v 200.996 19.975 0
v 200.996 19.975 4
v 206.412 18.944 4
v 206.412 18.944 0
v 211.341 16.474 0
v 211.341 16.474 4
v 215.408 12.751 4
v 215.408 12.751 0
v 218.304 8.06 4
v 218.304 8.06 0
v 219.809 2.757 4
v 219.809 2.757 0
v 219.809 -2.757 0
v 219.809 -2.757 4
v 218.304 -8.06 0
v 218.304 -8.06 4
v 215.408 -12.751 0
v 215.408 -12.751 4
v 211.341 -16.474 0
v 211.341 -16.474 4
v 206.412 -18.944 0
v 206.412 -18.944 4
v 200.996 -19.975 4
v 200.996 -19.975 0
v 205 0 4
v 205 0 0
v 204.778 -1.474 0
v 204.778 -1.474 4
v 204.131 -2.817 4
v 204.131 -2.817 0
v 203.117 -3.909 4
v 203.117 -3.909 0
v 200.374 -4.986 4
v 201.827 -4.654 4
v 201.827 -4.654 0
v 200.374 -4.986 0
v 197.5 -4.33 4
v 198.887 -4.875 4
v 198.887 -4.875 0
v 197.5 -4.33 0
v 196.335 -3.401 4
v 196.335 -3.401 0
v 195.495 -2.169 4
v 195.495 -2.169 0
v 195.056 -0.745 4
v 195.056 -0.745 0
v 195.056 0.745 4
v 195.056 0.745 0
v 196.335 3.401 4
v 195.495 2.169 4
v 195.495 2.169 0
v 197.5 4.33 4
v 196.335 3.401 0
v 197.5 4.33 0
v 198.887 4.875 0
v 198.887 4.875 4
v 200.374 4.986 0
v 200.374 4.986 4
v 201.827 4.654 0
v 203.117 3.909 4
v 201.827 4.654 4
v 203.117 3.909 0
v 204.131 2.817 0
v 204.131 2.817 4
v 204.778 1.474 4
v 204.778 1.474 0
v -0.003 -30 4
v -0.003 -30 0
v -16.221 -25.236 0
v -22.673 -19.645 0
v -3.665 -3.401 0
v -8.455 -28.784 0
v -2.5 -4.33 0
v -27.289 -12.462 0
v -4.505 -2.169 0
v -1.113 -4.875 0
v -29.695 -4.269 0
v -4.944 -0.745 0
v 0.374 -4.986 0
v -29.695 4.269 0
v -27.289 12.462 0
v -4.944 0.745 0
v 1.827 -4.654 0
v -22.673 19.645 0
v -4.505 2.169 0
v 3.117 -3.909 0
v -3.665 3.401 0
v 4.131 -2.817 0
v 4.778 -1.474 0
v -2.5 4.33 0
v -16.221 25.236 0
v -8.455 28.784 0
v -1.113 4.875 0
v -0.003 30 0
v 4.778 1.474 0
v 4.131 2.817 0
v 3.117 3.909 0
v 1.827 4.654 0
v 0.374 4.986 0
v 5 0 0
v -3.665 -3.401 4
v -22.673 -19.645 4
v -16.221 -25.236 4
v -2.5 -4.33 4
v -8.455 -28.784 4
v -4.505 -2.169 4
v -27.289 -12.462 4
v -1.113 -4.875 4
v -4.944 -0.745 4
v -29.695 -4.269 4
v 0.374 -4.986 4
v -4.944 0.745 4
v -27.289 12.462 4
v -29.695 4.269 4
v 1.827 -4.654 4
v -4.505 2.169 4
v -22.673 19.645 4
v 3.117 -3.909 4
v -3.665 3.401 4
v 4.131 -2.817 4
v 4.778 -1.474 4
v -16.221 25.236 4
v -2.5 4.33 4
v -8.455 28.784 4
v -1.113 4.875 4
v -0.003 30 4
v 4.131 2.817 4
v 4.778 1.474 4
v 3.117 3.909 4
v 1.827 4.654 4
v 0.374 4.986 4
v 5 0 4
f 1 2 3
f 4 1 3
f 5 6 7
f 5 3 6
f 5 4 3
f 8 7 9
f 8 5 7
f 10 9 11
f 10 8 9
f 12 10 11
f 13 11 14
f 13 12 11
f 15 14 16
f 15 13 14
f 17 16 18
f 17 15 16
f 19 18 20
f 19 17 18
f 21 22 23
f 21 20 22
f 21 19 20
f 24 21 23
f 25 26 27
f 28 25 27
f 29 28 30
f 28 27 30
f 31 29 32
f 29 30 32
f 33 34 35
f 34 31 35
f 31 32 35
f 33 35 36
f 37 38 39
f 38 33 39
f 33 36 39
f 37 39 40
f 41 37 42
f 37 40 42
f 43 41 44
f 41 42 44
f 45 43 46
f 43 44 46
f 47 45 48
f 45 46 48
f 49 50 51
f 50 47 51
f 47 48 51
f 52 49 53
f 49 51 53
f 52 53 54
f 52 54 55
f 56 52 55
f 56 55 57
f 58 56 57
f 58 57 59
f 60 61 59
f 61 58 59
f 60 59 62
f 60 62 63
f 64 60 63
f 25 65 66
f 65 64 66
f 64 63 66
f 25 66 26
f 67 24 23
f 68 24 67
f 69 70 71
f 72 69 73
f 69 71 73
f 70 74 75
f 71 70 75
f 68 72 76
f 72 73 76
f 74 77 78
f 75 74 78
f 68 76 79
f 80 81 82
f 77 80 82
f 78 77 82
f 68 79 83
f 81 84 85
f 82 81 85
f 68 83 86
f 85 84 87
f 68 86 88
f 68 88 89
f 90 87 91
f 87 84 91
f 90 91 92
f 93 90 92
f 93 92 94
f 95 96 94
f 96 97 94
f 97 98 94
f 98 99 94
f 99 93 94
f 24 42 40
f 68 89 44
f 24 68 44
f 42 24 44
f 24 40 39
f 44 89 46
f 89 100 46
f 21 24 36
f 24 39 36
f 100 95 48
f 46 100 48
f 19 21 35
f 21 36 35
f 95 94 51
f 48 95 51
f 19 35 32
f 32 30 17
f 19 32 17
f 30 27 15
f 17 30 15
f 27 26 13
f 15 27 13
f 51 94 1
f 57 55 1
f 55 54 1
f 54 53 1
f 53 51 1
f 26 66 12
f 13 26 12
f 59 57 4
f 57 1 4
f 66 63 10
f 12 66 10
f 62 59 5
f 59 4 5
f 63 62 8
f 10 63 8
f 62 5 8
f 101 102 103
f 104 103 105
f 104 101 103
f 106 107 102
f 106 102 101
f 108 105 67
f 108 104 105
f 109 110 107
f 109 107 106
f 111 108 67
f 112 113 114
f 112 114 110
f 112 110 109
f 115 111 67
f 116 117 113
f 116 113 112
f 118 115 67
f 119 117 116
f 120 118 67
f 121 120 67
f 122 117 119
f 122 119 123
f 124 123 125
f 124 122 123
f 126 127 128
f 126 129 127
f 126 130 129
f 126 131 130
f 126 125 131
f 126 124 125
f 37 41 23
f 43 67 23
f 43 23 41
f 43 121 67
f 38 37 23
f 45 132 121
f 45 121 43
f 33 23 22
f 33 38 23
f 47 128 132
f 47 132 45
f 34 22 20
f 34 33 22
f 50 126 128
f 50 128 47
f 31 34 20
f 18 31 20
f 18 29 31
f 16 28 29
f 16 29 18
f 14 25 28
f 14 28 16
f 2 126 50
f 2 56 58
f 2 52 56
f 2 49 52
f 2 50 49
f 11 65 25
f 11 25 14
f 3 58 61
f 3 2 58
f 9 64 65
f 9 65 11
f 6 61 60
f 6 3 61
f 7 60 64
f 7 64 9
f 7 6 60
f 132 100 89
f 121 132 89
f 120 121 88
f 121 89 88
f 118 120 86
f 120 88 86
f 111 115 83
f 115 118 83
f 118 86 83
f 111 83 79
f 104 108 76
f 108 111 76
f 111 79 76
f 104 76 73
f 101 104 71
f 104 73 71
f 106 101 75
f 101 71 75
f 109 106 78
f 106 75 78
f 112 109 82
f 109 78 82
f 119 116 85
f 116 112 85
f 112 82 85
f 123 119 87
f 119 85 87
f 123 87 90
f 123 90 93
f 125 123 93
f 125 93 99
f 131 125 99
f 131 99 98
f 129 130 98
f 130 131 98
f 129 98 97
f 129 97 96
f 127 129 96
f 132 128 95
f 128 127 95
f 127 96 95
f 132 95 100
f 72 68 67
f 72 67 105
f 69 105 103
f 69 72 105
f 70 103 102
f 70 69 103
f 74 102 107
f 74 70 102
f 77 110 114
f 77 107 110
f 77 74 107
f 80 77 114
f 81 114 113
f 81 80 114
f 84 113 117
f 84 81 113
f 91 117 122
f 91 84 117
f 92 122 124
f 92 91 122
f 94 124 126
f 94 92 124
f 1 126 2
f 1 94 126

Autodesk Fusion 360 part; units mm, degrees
sketch "Boceto1" plane through (0, 0, 0) normal (0, 0, 1) x (1, 0, 0)
  circle A0 centre (0, 0) radius 30
  circle A1 centre (200, 0) radius 20
  line L0 (-0.0033, 30) -> (200.9963, 19.9752)
  line L1 (200.9963, -19.9752) -> (-0.0033, -30)
  circle A2 centre (0, 0) radius 5
  circle A3 centre (200, 0) radius 5
extrude "Extruir1" add sketch "Boceto1" along normal blind 4 contours A0 L0 L1 | A0 A1 L0 L1 | A1
sketch "Boceto2" plane through (0, 0, 4) normal (0, 0, 1) x (-1, 0, 0)
  circle A0 centre (-200, 0) radius 5
  circle A1 centre (0, 0) radius 5
  arc A2 (0.0033, -30) -> (0.0033, 30) centre (0, 0) ccw
  line L0 (0.0033, 30) -> (-200.9963, 19.9752)
  arc A3 (-200.9963, 19.9752) -> (-200.9963, -19.9752) centre (-200, 0) ccw
  line L1 (-200.9963, -19.9752) -> (0.0033, -30)
  line L2 (0, 0) -> (-40, 0)
  line L3 (-40, 0) -> (-80, 0)
  line L4 (-80, 0) -> (-120, 0)
  line L5 (-120, 0) -> (-160, 0)
  line L6 (-160, 0) -> (-200, 0)
  line L7 (0, 0) -> (15, 0)
